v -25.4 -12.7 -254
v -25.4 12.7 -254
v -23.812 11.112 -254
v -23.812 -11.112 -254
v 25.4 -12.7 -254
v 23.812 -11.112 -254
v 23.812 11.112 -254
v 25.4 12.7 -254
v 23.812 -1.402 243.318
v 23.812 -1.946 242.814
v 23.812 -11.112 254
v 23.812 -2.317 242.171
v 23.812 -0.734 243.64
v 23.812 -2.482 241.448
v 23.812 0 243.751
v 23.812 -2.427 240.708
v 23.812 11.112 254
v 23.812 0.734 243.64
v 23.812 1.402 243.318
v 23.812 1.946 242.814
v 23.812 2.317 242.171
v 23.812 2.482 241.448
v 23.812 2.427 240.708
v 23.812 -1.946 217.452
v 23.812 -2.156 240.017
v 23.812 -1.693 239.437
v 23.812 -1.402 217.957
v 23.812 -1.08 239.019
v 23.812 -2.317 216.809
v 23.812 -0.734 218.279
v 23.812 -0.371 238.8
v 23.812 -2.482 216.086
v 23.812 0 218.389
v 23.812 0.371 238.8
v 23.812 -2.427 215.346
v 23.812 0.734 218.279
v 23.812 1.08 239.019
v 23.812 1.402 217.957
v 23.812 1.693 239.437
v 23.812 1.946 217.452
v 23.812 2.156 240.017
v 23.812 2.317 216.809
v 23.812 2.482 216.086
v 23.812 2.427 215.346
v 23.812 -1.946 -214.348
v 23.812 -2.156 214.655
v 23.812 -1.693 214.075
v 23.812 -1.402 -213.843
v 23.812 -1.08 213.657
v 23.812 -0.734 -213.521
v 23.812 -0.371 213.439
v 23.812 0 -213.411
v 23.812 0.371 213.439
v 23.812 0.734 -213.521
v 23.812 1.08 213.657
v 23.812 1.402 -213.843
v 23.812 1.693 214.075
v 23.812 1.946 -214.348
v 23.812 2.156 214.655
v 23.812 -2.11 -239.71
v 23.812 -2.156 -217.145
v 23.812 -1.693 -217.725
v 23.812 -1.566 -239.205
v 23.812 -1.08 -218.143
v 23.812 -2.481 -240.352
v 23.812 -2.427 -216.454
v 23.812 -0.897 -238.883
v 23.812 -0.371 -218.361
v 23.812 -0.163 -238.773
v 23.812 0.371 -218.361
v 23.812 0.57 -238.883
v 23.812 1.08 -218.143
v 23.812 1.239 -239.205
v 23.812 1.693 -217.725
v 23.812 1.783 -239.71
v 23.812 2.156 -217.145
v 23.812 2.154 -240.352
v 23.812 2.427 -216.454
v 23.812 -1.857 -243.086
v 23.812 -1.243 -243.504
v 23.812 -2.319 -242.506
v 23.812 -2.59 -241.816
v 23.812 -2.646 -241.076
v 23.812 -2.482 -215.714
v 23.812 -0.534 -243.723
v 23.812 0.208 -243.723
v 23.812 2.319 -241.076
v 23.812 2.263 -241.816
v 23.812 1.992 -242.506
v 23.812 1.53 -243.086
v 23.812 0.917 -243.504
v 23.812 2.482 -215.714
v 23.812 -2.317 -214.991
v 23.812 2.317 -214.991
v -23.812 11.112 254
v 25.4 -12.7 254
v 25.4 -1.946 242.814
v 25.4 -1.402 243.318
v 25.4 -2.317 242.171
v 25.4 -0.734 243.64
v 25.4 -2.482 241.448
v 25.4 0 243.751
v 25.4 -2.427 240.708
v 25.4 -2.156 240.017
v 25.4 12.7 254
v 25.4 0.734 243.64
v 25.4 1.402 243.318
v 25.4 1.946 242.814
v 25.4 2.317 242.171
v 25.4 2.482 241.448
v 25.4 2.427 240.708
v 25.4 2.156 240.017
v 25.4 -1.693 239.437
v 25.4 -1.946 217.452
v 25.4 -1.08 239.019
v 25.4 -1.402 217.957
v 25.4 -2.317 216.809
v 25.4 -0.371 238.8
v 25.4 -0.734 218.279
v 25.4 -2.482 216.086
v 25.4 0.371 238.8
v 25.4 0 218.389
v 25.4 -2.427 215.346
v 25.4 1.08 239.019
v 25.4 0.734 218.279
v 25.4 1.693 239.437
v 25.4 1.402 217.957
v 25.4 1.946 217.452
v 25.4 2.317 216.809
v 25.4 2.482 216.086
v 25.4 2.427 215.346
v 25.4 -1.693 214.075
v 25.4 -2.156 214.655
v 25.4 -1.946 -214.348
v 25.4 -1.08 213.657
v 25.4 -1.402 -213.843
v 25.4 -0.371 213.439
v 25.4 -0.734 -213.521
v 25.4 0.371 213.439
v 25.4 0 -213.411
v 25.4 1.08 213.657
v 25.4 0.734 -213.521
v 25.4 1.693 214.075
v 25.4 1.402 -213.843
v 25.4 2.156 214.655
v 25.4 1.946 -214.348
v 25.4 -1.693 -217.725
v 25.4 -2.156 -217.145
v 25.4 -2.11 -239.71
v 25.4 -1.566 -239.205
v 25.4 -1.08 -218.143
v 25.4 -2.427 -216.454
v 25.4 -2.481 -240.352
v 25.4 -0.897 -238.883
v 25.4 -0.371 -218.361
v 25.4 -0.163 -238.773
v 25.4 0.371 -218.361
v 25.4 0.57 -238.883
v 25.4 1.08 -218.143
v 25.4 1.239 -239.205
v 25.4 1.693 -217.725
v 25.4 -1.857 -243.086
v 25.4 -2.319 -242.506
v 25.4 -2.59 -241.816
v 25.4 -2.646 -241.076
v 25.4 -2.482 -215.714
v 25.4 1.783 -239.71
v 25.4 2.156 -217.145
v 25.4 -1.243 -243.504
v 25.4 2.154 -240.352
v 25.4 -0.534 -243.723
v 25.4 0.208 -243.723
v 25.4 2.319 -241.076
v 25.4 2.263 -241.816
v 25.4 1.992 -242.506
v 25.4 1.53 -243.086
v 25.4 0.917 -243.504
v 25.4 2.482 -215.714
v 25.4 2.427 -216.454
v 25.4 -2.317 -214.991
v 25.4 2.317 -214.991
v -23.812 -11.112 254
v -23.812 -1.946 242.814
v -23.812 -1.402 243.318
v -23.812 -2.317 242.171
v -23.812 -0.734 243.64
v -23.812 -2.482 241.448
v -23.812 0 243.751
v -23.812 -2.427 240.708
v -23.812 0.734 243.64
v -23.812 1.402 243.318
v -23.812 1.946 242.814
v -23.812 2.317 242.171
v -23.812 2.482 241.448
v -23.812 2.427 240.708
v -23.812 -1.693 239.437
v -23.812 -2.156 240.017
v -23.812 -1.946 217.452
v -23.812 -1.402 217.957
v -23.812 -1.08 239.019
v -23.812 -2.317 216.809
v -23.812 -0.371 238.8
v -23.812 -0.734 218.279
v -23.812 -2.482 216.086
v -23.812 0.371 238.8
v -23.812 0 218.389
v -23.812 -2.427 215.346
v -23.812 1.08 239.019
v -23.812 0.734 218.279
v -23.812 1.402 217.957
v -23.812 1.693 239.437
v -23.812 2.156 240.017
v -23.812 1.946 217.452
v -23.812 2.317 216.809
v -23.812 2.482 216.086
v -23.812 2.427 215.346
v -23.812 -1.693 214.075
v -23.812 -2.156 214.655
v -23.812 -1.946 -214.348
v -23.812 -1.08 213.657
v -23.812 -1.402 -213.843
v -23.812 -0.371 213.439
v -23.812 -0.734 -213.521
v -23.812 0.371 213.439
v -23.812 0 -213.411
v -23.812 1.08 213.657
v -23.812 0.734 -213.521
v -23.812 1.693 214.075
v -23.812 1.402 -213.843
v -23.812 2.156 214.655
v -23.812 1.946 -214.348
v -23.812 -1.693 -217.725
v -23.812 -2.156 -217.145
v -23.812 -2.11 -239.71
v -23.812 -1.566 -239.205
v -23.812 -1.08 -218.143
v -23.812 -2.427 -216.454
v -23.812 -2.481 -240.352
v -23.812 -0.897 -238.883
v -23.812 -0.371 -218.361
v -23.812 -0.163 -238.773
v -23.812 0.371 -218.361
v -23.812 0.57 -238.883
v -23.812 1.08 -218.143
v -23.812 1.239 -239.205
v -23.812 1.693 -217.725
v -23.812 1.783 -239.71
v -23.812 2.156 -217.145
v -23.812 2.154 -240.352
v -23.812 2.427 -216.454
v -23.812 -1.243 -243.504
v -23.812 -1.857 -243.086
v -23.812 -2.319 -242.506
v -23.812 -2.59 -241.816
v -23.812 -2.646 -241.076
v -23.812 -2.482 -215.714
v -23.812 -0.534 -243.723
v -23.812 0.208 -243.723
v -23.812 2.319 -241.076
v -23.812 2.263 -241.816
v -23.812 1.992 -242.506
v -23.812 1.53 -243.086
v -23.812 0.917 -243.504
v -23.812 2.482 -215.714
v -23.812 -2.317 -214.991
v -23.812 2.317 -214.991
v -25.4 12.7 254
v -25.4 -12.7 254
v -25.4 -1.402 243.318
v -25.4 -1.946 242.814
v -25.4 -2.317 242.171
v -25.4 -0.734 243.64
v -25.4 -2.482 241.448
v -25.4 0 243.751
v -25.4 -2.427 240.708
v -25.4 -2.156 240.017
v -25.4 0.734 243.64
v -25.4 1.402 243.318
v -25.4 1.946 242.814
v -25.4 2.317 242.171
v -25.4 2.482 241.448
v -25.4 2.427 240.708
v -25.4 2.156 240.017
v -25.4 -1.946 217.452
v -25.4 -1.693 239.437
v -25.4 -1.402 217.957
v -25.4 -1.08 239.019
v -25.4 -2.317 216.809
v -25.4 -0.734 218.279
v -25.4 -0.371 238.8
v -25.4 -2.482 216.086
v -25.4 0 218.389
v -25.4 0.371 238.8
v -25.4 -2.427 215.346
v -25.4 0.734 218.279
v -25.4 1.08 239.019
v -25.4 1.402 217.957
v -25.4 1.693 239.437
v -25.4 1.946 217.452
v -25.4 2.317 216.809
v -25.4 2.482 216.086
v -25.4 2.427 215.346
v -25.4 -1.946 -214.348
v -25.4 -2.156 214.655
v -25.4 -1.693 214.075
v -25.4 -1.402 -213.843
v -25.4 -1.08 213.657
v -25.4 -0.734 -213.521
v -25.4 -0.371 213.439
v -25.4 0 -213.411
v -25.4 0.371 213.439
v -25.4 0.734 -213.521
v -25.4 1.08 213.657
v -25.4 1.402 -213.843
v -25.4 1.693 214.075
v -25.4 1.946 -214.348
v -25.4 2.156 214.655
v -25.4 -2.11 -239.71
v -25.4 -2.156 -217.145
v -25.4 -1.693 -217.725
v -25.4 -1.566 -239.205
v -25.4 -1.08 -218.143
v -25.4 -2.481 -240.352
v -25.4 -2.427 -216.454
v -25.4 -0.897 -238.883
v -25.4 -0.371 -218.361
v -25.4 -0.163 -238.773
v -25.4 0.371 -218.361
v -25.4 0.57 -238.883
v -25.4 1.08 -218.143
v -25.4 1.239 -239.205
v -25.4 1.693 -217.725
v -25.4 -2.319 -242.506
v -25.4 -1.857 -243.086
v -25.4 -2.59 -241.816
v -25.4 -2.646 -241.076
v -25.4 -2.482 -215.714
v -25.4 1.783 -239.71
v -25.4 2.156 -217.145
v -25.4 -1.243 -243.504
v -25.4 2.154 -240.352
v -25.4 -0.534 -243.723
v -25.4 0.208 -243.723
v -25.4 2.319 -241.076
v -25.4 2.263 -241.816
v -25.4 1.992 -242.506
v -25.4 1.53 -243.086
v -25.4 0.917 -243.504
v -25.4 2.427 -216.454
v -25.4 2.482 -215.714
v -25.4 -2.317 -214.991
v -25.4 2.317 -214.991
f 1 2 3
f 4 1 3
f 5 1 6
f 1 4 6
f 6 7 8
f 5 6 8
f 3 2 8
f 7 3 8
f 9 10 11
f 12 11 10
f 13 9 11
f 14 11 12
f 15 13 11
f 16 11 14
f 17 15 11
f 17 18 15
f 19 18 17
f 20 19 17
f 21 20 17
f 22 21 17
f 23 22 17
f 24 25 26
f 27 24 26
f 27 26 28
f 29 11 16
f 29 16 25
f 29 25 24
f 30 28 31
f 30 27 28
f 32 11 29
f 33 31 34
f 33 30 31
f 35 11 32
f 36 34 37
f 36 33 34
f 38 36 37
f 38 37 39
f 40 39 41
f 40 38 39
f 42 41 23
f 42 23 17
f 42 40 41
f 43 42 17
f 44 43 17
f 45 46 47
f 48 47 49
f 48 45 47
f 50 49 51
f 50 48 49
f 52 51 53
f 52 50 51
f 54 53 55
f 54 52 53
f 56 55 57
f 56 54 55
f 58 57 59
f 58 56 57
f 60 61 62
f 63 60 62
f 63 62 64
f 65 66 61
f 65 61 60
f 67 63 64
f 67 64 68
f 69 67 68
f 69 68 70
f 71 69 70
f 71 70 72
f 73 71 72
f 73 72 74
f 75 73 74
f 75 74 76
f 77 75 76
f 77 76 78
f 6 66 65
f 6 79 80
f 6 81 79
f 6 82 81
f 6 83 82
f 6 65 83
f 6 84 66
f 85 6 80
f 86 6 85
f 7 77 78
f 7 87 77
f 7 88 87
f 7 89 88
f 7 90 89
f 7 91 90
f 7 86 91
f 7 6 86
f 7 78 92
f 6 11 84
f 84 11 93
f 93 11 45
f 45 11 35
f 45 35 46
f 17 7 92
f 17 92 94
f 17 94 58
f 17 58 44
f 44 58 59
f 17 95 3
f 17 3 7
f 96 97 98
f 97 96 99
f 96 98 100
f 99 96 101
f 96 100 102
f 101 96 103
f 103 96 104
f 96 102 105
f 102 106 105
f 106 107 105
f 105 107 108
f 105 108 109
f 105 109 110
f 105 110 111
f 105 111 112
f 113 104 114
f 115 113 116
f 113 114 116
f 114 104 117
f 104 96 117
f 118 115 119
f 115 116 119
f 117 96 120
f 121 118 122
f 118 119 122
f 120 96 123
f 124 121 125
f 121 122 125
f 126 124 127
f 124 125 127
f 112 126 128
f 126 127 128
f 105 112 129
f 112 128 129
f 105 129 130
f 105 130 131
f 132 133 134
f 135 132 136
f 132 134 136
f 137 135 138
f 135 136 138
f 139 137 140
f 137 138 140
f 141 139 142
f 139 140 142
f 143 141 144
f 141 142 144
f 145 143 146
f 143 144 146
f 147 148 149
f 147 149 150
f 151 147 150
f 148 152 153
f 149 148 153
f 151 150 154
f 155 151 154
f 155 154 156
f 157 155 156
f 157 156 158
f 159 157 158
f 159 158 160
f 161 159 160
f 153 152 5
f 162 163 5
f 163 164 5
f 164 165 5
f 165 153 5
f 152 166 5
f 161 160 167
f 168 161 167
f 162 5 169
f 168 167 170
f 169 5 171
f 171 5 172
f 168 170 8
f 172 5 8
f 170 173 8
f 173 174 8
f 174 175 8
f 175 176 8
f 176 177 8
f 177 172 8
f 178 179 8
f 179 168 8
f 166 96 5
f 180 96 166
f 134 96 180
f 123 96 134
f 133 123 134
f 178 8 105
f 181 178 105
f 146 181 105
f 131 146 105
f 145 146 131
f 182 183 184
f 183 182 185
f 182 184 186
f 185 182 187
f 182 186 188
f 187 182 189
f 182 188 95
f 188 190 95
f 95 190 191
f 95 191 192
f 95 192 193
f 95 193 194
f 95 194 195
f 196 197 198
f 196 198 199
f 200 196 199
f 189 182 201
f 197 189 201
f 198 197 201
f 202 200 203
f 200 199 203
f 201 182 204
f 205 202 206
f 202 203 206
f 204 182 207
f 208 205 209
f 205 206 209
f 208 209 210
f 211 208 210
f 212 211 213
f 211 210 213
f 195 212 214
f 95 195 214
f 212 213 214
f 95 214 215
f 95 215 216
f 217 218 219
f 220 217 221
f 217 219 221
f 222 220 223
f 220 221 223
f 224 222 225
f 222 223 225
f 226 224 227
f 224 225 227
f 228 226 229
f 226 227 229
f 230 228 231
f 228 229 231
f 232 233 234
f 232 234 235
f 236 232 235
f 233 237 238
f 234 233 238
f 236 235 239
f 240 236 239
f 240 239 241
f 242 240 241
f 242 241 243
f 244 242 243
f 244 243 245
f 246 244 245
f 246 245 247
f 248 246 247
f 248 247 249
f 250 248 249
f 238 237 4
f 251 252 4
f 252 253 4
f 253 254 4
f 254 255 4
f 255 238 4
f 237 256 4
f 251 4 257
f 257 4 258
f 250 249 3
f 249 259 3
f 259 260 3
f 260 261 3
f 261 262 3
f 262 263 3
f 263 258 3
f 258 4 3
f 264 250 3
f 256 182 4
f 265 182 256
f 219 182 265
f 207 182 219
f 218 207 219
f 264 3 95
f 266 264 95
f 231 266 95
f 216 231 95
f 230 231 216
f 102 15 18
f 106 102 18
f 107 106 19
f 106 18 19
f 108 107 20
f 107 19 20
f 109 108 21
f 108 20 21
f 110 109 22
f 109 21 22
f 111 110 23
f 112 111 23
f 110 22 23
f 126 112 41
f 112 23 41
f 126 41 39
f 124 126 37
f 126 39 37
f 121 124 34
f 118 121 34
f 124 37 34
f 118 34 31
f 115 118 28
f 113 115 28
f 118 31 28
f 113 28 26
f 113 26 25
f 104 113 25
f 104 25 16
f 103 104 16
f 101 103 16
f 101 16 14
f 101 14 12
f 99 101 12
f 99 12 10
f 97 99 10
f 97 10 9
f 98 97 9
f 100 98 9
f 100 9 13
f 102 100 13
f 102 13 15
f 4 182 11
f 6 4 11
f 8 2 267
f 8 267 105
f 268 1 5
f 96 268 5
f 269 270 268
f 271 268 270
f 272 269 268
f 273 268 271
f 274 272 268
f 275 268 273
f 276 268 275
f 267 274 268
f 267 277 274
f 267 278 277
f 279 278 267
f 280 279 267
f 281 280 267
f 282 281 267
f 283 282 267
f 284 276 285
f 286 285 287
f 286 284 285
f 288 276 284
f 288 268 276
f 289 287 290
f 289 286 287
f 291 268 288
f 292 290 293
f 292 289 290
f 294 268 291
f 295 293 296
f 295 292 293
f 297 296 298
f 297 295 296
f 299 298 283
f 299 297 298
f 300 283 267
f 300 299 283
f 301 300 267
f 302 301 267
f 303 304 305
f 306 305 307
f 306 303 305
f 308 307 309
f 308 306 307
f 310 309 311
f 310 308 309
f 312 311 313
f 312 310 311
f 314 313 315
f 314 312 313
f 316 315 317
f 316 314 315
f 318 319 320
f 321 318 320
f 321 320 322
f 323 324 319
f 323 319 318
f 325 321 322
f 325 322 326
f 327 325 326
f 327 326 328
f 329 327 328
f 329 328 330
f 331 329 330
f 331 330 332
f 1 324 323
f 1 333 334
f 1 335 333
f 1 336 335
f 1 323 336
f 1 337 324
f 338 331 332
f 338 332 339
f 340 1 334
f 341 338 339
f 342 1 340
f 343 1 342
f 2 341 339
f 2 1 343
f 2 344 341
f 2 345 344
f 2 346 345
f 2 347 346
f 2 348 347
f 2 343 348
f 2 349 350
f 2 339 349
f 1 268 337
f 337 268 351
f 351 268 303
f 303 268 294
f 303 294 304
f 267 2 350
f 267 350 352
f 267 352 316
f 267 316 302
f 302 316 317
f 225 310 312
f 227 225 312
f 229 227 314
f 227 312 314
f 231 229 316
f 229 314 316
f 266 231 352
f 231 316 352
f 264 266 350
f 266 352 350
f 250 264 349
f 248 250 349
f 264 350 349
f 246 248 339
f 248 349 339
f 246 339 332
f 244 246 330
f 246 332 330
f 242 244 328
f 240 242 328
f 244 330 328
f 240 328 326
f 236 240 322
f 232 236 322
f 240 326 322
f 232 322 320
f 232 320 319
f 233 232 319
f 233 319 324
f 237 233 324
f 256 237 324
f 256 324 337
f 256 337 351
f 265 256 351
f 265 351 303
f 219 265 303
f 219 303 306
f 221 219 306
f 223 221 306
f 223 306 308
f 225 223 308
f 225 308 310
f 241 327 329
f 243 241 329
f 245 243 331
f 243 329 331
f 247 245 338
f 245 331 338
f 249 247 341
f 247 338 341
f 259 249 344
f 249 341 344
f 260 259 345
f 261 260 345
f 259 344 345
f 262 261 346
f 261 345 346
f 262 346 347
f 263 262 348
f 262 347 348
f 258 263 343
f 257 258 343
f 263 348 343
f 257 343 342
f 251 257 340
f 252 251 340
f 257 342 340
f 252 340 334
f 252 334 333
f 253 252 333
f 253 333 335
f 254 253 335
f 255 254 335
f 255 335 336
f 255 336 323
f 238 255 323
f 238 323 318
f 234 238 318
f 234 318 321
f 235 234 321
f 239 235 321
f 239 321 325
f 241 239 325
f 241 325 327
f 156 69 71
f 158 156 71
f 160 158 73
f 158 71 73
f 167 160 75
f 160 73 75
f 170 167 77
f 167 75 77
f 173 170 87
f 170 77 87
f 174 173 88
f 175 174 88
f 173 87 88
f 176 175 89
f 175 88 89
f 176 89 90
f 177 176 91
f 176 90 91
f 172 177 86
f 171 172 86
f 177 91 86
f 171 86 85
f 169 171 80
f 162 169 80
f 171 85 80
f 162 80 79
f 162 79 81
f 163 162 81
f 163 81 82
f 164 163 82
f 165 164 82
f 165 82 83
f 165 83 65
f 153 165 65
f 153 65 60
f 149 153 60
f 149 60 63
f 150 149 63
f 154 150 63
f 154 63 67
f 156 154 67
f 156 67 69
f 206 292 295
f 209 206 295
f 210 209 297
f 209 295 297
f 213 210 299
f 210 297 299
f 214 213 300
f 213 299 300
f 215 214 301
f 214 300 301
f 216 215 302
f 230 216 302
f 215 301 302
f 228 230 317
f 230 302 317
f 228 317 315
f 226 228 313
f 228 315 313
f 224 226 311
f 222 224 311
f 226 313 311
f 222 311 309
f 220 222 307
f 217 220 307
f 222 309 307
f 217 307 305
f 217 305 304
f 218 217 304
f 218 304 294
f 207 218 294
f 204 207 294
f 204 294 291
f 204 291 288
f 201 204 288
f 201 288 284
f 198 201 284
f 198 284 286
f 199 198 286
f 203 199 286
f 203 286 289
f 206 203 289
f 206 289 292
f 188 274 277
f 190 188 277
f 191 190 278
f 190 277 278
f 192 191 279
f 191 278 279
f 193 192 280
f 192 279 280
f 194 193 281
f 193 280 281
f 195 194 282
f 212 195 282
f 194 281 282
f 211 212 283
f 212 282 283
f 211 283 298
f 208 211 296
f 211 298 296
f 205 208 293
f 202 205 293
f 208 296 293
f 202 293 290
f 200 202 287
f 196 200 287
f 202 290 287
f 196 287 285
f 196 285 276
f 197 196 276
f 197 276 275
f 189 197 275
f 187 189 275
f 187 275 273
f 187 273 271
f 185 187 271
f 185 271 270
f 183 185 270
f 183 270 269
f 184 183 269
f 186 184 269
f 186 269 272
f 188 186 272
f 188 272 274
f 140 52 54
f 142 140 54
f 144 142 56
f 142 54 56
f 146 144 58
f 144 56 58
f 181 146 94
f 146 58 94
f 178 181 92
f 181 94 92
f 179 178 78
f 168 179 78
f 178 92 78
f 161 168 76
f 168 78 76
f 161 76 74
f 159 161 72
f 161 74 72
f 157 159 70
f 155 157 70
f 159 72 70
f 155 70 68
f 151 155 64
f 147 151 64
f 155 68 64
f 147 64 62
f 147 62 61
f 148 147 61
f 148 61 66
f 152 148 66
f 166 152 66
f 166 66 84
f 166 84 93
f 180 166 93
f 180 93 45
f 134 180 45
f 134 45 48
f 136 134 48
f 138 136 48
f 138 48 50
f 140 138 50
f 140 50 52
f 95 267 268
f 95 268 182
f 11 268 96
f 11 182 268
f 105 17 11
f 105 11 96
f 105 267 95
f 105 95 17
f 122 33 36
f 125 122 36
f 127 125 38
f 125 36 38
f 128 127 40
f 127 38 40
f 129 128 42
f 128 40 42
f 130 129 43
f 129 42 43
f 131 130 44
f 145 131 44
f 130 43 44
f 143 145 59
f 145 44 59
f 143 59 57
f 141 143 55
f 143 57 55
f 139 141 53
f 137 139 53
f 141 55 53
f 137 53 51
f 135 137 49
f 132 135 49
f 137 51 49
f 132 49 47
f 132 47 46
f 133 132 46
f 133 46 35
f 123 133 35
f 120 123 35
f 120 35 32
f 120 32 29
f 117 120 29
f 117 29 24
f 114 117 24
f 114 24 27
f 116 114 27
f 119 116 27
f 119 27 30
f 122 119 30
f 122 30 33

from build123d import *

# Parameters (mm, degrees)
BOSS_EXTRUDE1_DEPTH      = 254.000001
BOSS_EXTRUDE1_DEPTH_BACK = 254.000001
SKETCH3_W                = 50.8
SKETCH3_H                = 25.4
SKETCH3_W_2              = 47.625
SKETCH3_H_2              = 22.225
F_10_CLEARANCE_HOLE1_D   = 4.9784


with BuildPart() as part:
    # Sketch3 → Boss-Extrude1 (new, two sides: drawn at the far end of the back side and taken through both)
    with BuildSketch(Plane.XY.offset(-BOSS_EXTRUDE1_DEPTH_BACK)):
        Rectangle(SKETCH3_W, SKETCH3_H)
        Rectangle(SKETCH3_W_2, SKETCH3_H_2, mode=Mode.SUBTRACT)
    extrude(amount=BOSS_EXTRUDE1_DEPTH + BOSS_EXTRUDE1_DEPTH_BACK)

    # #10 Clearance Hole1 (through all)
    with Locations(Plane(origin=(25.4, 0, 0), x_dir=(0, 0, -1), z_dir=(1, 0, 0))):
        with Locations((-215.900000508, 0), (-241.261771093, 0), (215.899999492, 0), (241.261770077, -0.163454089)):
            Hole(F_10_CLEARANCE_HOLE1_D / 2)


solid = part.part
